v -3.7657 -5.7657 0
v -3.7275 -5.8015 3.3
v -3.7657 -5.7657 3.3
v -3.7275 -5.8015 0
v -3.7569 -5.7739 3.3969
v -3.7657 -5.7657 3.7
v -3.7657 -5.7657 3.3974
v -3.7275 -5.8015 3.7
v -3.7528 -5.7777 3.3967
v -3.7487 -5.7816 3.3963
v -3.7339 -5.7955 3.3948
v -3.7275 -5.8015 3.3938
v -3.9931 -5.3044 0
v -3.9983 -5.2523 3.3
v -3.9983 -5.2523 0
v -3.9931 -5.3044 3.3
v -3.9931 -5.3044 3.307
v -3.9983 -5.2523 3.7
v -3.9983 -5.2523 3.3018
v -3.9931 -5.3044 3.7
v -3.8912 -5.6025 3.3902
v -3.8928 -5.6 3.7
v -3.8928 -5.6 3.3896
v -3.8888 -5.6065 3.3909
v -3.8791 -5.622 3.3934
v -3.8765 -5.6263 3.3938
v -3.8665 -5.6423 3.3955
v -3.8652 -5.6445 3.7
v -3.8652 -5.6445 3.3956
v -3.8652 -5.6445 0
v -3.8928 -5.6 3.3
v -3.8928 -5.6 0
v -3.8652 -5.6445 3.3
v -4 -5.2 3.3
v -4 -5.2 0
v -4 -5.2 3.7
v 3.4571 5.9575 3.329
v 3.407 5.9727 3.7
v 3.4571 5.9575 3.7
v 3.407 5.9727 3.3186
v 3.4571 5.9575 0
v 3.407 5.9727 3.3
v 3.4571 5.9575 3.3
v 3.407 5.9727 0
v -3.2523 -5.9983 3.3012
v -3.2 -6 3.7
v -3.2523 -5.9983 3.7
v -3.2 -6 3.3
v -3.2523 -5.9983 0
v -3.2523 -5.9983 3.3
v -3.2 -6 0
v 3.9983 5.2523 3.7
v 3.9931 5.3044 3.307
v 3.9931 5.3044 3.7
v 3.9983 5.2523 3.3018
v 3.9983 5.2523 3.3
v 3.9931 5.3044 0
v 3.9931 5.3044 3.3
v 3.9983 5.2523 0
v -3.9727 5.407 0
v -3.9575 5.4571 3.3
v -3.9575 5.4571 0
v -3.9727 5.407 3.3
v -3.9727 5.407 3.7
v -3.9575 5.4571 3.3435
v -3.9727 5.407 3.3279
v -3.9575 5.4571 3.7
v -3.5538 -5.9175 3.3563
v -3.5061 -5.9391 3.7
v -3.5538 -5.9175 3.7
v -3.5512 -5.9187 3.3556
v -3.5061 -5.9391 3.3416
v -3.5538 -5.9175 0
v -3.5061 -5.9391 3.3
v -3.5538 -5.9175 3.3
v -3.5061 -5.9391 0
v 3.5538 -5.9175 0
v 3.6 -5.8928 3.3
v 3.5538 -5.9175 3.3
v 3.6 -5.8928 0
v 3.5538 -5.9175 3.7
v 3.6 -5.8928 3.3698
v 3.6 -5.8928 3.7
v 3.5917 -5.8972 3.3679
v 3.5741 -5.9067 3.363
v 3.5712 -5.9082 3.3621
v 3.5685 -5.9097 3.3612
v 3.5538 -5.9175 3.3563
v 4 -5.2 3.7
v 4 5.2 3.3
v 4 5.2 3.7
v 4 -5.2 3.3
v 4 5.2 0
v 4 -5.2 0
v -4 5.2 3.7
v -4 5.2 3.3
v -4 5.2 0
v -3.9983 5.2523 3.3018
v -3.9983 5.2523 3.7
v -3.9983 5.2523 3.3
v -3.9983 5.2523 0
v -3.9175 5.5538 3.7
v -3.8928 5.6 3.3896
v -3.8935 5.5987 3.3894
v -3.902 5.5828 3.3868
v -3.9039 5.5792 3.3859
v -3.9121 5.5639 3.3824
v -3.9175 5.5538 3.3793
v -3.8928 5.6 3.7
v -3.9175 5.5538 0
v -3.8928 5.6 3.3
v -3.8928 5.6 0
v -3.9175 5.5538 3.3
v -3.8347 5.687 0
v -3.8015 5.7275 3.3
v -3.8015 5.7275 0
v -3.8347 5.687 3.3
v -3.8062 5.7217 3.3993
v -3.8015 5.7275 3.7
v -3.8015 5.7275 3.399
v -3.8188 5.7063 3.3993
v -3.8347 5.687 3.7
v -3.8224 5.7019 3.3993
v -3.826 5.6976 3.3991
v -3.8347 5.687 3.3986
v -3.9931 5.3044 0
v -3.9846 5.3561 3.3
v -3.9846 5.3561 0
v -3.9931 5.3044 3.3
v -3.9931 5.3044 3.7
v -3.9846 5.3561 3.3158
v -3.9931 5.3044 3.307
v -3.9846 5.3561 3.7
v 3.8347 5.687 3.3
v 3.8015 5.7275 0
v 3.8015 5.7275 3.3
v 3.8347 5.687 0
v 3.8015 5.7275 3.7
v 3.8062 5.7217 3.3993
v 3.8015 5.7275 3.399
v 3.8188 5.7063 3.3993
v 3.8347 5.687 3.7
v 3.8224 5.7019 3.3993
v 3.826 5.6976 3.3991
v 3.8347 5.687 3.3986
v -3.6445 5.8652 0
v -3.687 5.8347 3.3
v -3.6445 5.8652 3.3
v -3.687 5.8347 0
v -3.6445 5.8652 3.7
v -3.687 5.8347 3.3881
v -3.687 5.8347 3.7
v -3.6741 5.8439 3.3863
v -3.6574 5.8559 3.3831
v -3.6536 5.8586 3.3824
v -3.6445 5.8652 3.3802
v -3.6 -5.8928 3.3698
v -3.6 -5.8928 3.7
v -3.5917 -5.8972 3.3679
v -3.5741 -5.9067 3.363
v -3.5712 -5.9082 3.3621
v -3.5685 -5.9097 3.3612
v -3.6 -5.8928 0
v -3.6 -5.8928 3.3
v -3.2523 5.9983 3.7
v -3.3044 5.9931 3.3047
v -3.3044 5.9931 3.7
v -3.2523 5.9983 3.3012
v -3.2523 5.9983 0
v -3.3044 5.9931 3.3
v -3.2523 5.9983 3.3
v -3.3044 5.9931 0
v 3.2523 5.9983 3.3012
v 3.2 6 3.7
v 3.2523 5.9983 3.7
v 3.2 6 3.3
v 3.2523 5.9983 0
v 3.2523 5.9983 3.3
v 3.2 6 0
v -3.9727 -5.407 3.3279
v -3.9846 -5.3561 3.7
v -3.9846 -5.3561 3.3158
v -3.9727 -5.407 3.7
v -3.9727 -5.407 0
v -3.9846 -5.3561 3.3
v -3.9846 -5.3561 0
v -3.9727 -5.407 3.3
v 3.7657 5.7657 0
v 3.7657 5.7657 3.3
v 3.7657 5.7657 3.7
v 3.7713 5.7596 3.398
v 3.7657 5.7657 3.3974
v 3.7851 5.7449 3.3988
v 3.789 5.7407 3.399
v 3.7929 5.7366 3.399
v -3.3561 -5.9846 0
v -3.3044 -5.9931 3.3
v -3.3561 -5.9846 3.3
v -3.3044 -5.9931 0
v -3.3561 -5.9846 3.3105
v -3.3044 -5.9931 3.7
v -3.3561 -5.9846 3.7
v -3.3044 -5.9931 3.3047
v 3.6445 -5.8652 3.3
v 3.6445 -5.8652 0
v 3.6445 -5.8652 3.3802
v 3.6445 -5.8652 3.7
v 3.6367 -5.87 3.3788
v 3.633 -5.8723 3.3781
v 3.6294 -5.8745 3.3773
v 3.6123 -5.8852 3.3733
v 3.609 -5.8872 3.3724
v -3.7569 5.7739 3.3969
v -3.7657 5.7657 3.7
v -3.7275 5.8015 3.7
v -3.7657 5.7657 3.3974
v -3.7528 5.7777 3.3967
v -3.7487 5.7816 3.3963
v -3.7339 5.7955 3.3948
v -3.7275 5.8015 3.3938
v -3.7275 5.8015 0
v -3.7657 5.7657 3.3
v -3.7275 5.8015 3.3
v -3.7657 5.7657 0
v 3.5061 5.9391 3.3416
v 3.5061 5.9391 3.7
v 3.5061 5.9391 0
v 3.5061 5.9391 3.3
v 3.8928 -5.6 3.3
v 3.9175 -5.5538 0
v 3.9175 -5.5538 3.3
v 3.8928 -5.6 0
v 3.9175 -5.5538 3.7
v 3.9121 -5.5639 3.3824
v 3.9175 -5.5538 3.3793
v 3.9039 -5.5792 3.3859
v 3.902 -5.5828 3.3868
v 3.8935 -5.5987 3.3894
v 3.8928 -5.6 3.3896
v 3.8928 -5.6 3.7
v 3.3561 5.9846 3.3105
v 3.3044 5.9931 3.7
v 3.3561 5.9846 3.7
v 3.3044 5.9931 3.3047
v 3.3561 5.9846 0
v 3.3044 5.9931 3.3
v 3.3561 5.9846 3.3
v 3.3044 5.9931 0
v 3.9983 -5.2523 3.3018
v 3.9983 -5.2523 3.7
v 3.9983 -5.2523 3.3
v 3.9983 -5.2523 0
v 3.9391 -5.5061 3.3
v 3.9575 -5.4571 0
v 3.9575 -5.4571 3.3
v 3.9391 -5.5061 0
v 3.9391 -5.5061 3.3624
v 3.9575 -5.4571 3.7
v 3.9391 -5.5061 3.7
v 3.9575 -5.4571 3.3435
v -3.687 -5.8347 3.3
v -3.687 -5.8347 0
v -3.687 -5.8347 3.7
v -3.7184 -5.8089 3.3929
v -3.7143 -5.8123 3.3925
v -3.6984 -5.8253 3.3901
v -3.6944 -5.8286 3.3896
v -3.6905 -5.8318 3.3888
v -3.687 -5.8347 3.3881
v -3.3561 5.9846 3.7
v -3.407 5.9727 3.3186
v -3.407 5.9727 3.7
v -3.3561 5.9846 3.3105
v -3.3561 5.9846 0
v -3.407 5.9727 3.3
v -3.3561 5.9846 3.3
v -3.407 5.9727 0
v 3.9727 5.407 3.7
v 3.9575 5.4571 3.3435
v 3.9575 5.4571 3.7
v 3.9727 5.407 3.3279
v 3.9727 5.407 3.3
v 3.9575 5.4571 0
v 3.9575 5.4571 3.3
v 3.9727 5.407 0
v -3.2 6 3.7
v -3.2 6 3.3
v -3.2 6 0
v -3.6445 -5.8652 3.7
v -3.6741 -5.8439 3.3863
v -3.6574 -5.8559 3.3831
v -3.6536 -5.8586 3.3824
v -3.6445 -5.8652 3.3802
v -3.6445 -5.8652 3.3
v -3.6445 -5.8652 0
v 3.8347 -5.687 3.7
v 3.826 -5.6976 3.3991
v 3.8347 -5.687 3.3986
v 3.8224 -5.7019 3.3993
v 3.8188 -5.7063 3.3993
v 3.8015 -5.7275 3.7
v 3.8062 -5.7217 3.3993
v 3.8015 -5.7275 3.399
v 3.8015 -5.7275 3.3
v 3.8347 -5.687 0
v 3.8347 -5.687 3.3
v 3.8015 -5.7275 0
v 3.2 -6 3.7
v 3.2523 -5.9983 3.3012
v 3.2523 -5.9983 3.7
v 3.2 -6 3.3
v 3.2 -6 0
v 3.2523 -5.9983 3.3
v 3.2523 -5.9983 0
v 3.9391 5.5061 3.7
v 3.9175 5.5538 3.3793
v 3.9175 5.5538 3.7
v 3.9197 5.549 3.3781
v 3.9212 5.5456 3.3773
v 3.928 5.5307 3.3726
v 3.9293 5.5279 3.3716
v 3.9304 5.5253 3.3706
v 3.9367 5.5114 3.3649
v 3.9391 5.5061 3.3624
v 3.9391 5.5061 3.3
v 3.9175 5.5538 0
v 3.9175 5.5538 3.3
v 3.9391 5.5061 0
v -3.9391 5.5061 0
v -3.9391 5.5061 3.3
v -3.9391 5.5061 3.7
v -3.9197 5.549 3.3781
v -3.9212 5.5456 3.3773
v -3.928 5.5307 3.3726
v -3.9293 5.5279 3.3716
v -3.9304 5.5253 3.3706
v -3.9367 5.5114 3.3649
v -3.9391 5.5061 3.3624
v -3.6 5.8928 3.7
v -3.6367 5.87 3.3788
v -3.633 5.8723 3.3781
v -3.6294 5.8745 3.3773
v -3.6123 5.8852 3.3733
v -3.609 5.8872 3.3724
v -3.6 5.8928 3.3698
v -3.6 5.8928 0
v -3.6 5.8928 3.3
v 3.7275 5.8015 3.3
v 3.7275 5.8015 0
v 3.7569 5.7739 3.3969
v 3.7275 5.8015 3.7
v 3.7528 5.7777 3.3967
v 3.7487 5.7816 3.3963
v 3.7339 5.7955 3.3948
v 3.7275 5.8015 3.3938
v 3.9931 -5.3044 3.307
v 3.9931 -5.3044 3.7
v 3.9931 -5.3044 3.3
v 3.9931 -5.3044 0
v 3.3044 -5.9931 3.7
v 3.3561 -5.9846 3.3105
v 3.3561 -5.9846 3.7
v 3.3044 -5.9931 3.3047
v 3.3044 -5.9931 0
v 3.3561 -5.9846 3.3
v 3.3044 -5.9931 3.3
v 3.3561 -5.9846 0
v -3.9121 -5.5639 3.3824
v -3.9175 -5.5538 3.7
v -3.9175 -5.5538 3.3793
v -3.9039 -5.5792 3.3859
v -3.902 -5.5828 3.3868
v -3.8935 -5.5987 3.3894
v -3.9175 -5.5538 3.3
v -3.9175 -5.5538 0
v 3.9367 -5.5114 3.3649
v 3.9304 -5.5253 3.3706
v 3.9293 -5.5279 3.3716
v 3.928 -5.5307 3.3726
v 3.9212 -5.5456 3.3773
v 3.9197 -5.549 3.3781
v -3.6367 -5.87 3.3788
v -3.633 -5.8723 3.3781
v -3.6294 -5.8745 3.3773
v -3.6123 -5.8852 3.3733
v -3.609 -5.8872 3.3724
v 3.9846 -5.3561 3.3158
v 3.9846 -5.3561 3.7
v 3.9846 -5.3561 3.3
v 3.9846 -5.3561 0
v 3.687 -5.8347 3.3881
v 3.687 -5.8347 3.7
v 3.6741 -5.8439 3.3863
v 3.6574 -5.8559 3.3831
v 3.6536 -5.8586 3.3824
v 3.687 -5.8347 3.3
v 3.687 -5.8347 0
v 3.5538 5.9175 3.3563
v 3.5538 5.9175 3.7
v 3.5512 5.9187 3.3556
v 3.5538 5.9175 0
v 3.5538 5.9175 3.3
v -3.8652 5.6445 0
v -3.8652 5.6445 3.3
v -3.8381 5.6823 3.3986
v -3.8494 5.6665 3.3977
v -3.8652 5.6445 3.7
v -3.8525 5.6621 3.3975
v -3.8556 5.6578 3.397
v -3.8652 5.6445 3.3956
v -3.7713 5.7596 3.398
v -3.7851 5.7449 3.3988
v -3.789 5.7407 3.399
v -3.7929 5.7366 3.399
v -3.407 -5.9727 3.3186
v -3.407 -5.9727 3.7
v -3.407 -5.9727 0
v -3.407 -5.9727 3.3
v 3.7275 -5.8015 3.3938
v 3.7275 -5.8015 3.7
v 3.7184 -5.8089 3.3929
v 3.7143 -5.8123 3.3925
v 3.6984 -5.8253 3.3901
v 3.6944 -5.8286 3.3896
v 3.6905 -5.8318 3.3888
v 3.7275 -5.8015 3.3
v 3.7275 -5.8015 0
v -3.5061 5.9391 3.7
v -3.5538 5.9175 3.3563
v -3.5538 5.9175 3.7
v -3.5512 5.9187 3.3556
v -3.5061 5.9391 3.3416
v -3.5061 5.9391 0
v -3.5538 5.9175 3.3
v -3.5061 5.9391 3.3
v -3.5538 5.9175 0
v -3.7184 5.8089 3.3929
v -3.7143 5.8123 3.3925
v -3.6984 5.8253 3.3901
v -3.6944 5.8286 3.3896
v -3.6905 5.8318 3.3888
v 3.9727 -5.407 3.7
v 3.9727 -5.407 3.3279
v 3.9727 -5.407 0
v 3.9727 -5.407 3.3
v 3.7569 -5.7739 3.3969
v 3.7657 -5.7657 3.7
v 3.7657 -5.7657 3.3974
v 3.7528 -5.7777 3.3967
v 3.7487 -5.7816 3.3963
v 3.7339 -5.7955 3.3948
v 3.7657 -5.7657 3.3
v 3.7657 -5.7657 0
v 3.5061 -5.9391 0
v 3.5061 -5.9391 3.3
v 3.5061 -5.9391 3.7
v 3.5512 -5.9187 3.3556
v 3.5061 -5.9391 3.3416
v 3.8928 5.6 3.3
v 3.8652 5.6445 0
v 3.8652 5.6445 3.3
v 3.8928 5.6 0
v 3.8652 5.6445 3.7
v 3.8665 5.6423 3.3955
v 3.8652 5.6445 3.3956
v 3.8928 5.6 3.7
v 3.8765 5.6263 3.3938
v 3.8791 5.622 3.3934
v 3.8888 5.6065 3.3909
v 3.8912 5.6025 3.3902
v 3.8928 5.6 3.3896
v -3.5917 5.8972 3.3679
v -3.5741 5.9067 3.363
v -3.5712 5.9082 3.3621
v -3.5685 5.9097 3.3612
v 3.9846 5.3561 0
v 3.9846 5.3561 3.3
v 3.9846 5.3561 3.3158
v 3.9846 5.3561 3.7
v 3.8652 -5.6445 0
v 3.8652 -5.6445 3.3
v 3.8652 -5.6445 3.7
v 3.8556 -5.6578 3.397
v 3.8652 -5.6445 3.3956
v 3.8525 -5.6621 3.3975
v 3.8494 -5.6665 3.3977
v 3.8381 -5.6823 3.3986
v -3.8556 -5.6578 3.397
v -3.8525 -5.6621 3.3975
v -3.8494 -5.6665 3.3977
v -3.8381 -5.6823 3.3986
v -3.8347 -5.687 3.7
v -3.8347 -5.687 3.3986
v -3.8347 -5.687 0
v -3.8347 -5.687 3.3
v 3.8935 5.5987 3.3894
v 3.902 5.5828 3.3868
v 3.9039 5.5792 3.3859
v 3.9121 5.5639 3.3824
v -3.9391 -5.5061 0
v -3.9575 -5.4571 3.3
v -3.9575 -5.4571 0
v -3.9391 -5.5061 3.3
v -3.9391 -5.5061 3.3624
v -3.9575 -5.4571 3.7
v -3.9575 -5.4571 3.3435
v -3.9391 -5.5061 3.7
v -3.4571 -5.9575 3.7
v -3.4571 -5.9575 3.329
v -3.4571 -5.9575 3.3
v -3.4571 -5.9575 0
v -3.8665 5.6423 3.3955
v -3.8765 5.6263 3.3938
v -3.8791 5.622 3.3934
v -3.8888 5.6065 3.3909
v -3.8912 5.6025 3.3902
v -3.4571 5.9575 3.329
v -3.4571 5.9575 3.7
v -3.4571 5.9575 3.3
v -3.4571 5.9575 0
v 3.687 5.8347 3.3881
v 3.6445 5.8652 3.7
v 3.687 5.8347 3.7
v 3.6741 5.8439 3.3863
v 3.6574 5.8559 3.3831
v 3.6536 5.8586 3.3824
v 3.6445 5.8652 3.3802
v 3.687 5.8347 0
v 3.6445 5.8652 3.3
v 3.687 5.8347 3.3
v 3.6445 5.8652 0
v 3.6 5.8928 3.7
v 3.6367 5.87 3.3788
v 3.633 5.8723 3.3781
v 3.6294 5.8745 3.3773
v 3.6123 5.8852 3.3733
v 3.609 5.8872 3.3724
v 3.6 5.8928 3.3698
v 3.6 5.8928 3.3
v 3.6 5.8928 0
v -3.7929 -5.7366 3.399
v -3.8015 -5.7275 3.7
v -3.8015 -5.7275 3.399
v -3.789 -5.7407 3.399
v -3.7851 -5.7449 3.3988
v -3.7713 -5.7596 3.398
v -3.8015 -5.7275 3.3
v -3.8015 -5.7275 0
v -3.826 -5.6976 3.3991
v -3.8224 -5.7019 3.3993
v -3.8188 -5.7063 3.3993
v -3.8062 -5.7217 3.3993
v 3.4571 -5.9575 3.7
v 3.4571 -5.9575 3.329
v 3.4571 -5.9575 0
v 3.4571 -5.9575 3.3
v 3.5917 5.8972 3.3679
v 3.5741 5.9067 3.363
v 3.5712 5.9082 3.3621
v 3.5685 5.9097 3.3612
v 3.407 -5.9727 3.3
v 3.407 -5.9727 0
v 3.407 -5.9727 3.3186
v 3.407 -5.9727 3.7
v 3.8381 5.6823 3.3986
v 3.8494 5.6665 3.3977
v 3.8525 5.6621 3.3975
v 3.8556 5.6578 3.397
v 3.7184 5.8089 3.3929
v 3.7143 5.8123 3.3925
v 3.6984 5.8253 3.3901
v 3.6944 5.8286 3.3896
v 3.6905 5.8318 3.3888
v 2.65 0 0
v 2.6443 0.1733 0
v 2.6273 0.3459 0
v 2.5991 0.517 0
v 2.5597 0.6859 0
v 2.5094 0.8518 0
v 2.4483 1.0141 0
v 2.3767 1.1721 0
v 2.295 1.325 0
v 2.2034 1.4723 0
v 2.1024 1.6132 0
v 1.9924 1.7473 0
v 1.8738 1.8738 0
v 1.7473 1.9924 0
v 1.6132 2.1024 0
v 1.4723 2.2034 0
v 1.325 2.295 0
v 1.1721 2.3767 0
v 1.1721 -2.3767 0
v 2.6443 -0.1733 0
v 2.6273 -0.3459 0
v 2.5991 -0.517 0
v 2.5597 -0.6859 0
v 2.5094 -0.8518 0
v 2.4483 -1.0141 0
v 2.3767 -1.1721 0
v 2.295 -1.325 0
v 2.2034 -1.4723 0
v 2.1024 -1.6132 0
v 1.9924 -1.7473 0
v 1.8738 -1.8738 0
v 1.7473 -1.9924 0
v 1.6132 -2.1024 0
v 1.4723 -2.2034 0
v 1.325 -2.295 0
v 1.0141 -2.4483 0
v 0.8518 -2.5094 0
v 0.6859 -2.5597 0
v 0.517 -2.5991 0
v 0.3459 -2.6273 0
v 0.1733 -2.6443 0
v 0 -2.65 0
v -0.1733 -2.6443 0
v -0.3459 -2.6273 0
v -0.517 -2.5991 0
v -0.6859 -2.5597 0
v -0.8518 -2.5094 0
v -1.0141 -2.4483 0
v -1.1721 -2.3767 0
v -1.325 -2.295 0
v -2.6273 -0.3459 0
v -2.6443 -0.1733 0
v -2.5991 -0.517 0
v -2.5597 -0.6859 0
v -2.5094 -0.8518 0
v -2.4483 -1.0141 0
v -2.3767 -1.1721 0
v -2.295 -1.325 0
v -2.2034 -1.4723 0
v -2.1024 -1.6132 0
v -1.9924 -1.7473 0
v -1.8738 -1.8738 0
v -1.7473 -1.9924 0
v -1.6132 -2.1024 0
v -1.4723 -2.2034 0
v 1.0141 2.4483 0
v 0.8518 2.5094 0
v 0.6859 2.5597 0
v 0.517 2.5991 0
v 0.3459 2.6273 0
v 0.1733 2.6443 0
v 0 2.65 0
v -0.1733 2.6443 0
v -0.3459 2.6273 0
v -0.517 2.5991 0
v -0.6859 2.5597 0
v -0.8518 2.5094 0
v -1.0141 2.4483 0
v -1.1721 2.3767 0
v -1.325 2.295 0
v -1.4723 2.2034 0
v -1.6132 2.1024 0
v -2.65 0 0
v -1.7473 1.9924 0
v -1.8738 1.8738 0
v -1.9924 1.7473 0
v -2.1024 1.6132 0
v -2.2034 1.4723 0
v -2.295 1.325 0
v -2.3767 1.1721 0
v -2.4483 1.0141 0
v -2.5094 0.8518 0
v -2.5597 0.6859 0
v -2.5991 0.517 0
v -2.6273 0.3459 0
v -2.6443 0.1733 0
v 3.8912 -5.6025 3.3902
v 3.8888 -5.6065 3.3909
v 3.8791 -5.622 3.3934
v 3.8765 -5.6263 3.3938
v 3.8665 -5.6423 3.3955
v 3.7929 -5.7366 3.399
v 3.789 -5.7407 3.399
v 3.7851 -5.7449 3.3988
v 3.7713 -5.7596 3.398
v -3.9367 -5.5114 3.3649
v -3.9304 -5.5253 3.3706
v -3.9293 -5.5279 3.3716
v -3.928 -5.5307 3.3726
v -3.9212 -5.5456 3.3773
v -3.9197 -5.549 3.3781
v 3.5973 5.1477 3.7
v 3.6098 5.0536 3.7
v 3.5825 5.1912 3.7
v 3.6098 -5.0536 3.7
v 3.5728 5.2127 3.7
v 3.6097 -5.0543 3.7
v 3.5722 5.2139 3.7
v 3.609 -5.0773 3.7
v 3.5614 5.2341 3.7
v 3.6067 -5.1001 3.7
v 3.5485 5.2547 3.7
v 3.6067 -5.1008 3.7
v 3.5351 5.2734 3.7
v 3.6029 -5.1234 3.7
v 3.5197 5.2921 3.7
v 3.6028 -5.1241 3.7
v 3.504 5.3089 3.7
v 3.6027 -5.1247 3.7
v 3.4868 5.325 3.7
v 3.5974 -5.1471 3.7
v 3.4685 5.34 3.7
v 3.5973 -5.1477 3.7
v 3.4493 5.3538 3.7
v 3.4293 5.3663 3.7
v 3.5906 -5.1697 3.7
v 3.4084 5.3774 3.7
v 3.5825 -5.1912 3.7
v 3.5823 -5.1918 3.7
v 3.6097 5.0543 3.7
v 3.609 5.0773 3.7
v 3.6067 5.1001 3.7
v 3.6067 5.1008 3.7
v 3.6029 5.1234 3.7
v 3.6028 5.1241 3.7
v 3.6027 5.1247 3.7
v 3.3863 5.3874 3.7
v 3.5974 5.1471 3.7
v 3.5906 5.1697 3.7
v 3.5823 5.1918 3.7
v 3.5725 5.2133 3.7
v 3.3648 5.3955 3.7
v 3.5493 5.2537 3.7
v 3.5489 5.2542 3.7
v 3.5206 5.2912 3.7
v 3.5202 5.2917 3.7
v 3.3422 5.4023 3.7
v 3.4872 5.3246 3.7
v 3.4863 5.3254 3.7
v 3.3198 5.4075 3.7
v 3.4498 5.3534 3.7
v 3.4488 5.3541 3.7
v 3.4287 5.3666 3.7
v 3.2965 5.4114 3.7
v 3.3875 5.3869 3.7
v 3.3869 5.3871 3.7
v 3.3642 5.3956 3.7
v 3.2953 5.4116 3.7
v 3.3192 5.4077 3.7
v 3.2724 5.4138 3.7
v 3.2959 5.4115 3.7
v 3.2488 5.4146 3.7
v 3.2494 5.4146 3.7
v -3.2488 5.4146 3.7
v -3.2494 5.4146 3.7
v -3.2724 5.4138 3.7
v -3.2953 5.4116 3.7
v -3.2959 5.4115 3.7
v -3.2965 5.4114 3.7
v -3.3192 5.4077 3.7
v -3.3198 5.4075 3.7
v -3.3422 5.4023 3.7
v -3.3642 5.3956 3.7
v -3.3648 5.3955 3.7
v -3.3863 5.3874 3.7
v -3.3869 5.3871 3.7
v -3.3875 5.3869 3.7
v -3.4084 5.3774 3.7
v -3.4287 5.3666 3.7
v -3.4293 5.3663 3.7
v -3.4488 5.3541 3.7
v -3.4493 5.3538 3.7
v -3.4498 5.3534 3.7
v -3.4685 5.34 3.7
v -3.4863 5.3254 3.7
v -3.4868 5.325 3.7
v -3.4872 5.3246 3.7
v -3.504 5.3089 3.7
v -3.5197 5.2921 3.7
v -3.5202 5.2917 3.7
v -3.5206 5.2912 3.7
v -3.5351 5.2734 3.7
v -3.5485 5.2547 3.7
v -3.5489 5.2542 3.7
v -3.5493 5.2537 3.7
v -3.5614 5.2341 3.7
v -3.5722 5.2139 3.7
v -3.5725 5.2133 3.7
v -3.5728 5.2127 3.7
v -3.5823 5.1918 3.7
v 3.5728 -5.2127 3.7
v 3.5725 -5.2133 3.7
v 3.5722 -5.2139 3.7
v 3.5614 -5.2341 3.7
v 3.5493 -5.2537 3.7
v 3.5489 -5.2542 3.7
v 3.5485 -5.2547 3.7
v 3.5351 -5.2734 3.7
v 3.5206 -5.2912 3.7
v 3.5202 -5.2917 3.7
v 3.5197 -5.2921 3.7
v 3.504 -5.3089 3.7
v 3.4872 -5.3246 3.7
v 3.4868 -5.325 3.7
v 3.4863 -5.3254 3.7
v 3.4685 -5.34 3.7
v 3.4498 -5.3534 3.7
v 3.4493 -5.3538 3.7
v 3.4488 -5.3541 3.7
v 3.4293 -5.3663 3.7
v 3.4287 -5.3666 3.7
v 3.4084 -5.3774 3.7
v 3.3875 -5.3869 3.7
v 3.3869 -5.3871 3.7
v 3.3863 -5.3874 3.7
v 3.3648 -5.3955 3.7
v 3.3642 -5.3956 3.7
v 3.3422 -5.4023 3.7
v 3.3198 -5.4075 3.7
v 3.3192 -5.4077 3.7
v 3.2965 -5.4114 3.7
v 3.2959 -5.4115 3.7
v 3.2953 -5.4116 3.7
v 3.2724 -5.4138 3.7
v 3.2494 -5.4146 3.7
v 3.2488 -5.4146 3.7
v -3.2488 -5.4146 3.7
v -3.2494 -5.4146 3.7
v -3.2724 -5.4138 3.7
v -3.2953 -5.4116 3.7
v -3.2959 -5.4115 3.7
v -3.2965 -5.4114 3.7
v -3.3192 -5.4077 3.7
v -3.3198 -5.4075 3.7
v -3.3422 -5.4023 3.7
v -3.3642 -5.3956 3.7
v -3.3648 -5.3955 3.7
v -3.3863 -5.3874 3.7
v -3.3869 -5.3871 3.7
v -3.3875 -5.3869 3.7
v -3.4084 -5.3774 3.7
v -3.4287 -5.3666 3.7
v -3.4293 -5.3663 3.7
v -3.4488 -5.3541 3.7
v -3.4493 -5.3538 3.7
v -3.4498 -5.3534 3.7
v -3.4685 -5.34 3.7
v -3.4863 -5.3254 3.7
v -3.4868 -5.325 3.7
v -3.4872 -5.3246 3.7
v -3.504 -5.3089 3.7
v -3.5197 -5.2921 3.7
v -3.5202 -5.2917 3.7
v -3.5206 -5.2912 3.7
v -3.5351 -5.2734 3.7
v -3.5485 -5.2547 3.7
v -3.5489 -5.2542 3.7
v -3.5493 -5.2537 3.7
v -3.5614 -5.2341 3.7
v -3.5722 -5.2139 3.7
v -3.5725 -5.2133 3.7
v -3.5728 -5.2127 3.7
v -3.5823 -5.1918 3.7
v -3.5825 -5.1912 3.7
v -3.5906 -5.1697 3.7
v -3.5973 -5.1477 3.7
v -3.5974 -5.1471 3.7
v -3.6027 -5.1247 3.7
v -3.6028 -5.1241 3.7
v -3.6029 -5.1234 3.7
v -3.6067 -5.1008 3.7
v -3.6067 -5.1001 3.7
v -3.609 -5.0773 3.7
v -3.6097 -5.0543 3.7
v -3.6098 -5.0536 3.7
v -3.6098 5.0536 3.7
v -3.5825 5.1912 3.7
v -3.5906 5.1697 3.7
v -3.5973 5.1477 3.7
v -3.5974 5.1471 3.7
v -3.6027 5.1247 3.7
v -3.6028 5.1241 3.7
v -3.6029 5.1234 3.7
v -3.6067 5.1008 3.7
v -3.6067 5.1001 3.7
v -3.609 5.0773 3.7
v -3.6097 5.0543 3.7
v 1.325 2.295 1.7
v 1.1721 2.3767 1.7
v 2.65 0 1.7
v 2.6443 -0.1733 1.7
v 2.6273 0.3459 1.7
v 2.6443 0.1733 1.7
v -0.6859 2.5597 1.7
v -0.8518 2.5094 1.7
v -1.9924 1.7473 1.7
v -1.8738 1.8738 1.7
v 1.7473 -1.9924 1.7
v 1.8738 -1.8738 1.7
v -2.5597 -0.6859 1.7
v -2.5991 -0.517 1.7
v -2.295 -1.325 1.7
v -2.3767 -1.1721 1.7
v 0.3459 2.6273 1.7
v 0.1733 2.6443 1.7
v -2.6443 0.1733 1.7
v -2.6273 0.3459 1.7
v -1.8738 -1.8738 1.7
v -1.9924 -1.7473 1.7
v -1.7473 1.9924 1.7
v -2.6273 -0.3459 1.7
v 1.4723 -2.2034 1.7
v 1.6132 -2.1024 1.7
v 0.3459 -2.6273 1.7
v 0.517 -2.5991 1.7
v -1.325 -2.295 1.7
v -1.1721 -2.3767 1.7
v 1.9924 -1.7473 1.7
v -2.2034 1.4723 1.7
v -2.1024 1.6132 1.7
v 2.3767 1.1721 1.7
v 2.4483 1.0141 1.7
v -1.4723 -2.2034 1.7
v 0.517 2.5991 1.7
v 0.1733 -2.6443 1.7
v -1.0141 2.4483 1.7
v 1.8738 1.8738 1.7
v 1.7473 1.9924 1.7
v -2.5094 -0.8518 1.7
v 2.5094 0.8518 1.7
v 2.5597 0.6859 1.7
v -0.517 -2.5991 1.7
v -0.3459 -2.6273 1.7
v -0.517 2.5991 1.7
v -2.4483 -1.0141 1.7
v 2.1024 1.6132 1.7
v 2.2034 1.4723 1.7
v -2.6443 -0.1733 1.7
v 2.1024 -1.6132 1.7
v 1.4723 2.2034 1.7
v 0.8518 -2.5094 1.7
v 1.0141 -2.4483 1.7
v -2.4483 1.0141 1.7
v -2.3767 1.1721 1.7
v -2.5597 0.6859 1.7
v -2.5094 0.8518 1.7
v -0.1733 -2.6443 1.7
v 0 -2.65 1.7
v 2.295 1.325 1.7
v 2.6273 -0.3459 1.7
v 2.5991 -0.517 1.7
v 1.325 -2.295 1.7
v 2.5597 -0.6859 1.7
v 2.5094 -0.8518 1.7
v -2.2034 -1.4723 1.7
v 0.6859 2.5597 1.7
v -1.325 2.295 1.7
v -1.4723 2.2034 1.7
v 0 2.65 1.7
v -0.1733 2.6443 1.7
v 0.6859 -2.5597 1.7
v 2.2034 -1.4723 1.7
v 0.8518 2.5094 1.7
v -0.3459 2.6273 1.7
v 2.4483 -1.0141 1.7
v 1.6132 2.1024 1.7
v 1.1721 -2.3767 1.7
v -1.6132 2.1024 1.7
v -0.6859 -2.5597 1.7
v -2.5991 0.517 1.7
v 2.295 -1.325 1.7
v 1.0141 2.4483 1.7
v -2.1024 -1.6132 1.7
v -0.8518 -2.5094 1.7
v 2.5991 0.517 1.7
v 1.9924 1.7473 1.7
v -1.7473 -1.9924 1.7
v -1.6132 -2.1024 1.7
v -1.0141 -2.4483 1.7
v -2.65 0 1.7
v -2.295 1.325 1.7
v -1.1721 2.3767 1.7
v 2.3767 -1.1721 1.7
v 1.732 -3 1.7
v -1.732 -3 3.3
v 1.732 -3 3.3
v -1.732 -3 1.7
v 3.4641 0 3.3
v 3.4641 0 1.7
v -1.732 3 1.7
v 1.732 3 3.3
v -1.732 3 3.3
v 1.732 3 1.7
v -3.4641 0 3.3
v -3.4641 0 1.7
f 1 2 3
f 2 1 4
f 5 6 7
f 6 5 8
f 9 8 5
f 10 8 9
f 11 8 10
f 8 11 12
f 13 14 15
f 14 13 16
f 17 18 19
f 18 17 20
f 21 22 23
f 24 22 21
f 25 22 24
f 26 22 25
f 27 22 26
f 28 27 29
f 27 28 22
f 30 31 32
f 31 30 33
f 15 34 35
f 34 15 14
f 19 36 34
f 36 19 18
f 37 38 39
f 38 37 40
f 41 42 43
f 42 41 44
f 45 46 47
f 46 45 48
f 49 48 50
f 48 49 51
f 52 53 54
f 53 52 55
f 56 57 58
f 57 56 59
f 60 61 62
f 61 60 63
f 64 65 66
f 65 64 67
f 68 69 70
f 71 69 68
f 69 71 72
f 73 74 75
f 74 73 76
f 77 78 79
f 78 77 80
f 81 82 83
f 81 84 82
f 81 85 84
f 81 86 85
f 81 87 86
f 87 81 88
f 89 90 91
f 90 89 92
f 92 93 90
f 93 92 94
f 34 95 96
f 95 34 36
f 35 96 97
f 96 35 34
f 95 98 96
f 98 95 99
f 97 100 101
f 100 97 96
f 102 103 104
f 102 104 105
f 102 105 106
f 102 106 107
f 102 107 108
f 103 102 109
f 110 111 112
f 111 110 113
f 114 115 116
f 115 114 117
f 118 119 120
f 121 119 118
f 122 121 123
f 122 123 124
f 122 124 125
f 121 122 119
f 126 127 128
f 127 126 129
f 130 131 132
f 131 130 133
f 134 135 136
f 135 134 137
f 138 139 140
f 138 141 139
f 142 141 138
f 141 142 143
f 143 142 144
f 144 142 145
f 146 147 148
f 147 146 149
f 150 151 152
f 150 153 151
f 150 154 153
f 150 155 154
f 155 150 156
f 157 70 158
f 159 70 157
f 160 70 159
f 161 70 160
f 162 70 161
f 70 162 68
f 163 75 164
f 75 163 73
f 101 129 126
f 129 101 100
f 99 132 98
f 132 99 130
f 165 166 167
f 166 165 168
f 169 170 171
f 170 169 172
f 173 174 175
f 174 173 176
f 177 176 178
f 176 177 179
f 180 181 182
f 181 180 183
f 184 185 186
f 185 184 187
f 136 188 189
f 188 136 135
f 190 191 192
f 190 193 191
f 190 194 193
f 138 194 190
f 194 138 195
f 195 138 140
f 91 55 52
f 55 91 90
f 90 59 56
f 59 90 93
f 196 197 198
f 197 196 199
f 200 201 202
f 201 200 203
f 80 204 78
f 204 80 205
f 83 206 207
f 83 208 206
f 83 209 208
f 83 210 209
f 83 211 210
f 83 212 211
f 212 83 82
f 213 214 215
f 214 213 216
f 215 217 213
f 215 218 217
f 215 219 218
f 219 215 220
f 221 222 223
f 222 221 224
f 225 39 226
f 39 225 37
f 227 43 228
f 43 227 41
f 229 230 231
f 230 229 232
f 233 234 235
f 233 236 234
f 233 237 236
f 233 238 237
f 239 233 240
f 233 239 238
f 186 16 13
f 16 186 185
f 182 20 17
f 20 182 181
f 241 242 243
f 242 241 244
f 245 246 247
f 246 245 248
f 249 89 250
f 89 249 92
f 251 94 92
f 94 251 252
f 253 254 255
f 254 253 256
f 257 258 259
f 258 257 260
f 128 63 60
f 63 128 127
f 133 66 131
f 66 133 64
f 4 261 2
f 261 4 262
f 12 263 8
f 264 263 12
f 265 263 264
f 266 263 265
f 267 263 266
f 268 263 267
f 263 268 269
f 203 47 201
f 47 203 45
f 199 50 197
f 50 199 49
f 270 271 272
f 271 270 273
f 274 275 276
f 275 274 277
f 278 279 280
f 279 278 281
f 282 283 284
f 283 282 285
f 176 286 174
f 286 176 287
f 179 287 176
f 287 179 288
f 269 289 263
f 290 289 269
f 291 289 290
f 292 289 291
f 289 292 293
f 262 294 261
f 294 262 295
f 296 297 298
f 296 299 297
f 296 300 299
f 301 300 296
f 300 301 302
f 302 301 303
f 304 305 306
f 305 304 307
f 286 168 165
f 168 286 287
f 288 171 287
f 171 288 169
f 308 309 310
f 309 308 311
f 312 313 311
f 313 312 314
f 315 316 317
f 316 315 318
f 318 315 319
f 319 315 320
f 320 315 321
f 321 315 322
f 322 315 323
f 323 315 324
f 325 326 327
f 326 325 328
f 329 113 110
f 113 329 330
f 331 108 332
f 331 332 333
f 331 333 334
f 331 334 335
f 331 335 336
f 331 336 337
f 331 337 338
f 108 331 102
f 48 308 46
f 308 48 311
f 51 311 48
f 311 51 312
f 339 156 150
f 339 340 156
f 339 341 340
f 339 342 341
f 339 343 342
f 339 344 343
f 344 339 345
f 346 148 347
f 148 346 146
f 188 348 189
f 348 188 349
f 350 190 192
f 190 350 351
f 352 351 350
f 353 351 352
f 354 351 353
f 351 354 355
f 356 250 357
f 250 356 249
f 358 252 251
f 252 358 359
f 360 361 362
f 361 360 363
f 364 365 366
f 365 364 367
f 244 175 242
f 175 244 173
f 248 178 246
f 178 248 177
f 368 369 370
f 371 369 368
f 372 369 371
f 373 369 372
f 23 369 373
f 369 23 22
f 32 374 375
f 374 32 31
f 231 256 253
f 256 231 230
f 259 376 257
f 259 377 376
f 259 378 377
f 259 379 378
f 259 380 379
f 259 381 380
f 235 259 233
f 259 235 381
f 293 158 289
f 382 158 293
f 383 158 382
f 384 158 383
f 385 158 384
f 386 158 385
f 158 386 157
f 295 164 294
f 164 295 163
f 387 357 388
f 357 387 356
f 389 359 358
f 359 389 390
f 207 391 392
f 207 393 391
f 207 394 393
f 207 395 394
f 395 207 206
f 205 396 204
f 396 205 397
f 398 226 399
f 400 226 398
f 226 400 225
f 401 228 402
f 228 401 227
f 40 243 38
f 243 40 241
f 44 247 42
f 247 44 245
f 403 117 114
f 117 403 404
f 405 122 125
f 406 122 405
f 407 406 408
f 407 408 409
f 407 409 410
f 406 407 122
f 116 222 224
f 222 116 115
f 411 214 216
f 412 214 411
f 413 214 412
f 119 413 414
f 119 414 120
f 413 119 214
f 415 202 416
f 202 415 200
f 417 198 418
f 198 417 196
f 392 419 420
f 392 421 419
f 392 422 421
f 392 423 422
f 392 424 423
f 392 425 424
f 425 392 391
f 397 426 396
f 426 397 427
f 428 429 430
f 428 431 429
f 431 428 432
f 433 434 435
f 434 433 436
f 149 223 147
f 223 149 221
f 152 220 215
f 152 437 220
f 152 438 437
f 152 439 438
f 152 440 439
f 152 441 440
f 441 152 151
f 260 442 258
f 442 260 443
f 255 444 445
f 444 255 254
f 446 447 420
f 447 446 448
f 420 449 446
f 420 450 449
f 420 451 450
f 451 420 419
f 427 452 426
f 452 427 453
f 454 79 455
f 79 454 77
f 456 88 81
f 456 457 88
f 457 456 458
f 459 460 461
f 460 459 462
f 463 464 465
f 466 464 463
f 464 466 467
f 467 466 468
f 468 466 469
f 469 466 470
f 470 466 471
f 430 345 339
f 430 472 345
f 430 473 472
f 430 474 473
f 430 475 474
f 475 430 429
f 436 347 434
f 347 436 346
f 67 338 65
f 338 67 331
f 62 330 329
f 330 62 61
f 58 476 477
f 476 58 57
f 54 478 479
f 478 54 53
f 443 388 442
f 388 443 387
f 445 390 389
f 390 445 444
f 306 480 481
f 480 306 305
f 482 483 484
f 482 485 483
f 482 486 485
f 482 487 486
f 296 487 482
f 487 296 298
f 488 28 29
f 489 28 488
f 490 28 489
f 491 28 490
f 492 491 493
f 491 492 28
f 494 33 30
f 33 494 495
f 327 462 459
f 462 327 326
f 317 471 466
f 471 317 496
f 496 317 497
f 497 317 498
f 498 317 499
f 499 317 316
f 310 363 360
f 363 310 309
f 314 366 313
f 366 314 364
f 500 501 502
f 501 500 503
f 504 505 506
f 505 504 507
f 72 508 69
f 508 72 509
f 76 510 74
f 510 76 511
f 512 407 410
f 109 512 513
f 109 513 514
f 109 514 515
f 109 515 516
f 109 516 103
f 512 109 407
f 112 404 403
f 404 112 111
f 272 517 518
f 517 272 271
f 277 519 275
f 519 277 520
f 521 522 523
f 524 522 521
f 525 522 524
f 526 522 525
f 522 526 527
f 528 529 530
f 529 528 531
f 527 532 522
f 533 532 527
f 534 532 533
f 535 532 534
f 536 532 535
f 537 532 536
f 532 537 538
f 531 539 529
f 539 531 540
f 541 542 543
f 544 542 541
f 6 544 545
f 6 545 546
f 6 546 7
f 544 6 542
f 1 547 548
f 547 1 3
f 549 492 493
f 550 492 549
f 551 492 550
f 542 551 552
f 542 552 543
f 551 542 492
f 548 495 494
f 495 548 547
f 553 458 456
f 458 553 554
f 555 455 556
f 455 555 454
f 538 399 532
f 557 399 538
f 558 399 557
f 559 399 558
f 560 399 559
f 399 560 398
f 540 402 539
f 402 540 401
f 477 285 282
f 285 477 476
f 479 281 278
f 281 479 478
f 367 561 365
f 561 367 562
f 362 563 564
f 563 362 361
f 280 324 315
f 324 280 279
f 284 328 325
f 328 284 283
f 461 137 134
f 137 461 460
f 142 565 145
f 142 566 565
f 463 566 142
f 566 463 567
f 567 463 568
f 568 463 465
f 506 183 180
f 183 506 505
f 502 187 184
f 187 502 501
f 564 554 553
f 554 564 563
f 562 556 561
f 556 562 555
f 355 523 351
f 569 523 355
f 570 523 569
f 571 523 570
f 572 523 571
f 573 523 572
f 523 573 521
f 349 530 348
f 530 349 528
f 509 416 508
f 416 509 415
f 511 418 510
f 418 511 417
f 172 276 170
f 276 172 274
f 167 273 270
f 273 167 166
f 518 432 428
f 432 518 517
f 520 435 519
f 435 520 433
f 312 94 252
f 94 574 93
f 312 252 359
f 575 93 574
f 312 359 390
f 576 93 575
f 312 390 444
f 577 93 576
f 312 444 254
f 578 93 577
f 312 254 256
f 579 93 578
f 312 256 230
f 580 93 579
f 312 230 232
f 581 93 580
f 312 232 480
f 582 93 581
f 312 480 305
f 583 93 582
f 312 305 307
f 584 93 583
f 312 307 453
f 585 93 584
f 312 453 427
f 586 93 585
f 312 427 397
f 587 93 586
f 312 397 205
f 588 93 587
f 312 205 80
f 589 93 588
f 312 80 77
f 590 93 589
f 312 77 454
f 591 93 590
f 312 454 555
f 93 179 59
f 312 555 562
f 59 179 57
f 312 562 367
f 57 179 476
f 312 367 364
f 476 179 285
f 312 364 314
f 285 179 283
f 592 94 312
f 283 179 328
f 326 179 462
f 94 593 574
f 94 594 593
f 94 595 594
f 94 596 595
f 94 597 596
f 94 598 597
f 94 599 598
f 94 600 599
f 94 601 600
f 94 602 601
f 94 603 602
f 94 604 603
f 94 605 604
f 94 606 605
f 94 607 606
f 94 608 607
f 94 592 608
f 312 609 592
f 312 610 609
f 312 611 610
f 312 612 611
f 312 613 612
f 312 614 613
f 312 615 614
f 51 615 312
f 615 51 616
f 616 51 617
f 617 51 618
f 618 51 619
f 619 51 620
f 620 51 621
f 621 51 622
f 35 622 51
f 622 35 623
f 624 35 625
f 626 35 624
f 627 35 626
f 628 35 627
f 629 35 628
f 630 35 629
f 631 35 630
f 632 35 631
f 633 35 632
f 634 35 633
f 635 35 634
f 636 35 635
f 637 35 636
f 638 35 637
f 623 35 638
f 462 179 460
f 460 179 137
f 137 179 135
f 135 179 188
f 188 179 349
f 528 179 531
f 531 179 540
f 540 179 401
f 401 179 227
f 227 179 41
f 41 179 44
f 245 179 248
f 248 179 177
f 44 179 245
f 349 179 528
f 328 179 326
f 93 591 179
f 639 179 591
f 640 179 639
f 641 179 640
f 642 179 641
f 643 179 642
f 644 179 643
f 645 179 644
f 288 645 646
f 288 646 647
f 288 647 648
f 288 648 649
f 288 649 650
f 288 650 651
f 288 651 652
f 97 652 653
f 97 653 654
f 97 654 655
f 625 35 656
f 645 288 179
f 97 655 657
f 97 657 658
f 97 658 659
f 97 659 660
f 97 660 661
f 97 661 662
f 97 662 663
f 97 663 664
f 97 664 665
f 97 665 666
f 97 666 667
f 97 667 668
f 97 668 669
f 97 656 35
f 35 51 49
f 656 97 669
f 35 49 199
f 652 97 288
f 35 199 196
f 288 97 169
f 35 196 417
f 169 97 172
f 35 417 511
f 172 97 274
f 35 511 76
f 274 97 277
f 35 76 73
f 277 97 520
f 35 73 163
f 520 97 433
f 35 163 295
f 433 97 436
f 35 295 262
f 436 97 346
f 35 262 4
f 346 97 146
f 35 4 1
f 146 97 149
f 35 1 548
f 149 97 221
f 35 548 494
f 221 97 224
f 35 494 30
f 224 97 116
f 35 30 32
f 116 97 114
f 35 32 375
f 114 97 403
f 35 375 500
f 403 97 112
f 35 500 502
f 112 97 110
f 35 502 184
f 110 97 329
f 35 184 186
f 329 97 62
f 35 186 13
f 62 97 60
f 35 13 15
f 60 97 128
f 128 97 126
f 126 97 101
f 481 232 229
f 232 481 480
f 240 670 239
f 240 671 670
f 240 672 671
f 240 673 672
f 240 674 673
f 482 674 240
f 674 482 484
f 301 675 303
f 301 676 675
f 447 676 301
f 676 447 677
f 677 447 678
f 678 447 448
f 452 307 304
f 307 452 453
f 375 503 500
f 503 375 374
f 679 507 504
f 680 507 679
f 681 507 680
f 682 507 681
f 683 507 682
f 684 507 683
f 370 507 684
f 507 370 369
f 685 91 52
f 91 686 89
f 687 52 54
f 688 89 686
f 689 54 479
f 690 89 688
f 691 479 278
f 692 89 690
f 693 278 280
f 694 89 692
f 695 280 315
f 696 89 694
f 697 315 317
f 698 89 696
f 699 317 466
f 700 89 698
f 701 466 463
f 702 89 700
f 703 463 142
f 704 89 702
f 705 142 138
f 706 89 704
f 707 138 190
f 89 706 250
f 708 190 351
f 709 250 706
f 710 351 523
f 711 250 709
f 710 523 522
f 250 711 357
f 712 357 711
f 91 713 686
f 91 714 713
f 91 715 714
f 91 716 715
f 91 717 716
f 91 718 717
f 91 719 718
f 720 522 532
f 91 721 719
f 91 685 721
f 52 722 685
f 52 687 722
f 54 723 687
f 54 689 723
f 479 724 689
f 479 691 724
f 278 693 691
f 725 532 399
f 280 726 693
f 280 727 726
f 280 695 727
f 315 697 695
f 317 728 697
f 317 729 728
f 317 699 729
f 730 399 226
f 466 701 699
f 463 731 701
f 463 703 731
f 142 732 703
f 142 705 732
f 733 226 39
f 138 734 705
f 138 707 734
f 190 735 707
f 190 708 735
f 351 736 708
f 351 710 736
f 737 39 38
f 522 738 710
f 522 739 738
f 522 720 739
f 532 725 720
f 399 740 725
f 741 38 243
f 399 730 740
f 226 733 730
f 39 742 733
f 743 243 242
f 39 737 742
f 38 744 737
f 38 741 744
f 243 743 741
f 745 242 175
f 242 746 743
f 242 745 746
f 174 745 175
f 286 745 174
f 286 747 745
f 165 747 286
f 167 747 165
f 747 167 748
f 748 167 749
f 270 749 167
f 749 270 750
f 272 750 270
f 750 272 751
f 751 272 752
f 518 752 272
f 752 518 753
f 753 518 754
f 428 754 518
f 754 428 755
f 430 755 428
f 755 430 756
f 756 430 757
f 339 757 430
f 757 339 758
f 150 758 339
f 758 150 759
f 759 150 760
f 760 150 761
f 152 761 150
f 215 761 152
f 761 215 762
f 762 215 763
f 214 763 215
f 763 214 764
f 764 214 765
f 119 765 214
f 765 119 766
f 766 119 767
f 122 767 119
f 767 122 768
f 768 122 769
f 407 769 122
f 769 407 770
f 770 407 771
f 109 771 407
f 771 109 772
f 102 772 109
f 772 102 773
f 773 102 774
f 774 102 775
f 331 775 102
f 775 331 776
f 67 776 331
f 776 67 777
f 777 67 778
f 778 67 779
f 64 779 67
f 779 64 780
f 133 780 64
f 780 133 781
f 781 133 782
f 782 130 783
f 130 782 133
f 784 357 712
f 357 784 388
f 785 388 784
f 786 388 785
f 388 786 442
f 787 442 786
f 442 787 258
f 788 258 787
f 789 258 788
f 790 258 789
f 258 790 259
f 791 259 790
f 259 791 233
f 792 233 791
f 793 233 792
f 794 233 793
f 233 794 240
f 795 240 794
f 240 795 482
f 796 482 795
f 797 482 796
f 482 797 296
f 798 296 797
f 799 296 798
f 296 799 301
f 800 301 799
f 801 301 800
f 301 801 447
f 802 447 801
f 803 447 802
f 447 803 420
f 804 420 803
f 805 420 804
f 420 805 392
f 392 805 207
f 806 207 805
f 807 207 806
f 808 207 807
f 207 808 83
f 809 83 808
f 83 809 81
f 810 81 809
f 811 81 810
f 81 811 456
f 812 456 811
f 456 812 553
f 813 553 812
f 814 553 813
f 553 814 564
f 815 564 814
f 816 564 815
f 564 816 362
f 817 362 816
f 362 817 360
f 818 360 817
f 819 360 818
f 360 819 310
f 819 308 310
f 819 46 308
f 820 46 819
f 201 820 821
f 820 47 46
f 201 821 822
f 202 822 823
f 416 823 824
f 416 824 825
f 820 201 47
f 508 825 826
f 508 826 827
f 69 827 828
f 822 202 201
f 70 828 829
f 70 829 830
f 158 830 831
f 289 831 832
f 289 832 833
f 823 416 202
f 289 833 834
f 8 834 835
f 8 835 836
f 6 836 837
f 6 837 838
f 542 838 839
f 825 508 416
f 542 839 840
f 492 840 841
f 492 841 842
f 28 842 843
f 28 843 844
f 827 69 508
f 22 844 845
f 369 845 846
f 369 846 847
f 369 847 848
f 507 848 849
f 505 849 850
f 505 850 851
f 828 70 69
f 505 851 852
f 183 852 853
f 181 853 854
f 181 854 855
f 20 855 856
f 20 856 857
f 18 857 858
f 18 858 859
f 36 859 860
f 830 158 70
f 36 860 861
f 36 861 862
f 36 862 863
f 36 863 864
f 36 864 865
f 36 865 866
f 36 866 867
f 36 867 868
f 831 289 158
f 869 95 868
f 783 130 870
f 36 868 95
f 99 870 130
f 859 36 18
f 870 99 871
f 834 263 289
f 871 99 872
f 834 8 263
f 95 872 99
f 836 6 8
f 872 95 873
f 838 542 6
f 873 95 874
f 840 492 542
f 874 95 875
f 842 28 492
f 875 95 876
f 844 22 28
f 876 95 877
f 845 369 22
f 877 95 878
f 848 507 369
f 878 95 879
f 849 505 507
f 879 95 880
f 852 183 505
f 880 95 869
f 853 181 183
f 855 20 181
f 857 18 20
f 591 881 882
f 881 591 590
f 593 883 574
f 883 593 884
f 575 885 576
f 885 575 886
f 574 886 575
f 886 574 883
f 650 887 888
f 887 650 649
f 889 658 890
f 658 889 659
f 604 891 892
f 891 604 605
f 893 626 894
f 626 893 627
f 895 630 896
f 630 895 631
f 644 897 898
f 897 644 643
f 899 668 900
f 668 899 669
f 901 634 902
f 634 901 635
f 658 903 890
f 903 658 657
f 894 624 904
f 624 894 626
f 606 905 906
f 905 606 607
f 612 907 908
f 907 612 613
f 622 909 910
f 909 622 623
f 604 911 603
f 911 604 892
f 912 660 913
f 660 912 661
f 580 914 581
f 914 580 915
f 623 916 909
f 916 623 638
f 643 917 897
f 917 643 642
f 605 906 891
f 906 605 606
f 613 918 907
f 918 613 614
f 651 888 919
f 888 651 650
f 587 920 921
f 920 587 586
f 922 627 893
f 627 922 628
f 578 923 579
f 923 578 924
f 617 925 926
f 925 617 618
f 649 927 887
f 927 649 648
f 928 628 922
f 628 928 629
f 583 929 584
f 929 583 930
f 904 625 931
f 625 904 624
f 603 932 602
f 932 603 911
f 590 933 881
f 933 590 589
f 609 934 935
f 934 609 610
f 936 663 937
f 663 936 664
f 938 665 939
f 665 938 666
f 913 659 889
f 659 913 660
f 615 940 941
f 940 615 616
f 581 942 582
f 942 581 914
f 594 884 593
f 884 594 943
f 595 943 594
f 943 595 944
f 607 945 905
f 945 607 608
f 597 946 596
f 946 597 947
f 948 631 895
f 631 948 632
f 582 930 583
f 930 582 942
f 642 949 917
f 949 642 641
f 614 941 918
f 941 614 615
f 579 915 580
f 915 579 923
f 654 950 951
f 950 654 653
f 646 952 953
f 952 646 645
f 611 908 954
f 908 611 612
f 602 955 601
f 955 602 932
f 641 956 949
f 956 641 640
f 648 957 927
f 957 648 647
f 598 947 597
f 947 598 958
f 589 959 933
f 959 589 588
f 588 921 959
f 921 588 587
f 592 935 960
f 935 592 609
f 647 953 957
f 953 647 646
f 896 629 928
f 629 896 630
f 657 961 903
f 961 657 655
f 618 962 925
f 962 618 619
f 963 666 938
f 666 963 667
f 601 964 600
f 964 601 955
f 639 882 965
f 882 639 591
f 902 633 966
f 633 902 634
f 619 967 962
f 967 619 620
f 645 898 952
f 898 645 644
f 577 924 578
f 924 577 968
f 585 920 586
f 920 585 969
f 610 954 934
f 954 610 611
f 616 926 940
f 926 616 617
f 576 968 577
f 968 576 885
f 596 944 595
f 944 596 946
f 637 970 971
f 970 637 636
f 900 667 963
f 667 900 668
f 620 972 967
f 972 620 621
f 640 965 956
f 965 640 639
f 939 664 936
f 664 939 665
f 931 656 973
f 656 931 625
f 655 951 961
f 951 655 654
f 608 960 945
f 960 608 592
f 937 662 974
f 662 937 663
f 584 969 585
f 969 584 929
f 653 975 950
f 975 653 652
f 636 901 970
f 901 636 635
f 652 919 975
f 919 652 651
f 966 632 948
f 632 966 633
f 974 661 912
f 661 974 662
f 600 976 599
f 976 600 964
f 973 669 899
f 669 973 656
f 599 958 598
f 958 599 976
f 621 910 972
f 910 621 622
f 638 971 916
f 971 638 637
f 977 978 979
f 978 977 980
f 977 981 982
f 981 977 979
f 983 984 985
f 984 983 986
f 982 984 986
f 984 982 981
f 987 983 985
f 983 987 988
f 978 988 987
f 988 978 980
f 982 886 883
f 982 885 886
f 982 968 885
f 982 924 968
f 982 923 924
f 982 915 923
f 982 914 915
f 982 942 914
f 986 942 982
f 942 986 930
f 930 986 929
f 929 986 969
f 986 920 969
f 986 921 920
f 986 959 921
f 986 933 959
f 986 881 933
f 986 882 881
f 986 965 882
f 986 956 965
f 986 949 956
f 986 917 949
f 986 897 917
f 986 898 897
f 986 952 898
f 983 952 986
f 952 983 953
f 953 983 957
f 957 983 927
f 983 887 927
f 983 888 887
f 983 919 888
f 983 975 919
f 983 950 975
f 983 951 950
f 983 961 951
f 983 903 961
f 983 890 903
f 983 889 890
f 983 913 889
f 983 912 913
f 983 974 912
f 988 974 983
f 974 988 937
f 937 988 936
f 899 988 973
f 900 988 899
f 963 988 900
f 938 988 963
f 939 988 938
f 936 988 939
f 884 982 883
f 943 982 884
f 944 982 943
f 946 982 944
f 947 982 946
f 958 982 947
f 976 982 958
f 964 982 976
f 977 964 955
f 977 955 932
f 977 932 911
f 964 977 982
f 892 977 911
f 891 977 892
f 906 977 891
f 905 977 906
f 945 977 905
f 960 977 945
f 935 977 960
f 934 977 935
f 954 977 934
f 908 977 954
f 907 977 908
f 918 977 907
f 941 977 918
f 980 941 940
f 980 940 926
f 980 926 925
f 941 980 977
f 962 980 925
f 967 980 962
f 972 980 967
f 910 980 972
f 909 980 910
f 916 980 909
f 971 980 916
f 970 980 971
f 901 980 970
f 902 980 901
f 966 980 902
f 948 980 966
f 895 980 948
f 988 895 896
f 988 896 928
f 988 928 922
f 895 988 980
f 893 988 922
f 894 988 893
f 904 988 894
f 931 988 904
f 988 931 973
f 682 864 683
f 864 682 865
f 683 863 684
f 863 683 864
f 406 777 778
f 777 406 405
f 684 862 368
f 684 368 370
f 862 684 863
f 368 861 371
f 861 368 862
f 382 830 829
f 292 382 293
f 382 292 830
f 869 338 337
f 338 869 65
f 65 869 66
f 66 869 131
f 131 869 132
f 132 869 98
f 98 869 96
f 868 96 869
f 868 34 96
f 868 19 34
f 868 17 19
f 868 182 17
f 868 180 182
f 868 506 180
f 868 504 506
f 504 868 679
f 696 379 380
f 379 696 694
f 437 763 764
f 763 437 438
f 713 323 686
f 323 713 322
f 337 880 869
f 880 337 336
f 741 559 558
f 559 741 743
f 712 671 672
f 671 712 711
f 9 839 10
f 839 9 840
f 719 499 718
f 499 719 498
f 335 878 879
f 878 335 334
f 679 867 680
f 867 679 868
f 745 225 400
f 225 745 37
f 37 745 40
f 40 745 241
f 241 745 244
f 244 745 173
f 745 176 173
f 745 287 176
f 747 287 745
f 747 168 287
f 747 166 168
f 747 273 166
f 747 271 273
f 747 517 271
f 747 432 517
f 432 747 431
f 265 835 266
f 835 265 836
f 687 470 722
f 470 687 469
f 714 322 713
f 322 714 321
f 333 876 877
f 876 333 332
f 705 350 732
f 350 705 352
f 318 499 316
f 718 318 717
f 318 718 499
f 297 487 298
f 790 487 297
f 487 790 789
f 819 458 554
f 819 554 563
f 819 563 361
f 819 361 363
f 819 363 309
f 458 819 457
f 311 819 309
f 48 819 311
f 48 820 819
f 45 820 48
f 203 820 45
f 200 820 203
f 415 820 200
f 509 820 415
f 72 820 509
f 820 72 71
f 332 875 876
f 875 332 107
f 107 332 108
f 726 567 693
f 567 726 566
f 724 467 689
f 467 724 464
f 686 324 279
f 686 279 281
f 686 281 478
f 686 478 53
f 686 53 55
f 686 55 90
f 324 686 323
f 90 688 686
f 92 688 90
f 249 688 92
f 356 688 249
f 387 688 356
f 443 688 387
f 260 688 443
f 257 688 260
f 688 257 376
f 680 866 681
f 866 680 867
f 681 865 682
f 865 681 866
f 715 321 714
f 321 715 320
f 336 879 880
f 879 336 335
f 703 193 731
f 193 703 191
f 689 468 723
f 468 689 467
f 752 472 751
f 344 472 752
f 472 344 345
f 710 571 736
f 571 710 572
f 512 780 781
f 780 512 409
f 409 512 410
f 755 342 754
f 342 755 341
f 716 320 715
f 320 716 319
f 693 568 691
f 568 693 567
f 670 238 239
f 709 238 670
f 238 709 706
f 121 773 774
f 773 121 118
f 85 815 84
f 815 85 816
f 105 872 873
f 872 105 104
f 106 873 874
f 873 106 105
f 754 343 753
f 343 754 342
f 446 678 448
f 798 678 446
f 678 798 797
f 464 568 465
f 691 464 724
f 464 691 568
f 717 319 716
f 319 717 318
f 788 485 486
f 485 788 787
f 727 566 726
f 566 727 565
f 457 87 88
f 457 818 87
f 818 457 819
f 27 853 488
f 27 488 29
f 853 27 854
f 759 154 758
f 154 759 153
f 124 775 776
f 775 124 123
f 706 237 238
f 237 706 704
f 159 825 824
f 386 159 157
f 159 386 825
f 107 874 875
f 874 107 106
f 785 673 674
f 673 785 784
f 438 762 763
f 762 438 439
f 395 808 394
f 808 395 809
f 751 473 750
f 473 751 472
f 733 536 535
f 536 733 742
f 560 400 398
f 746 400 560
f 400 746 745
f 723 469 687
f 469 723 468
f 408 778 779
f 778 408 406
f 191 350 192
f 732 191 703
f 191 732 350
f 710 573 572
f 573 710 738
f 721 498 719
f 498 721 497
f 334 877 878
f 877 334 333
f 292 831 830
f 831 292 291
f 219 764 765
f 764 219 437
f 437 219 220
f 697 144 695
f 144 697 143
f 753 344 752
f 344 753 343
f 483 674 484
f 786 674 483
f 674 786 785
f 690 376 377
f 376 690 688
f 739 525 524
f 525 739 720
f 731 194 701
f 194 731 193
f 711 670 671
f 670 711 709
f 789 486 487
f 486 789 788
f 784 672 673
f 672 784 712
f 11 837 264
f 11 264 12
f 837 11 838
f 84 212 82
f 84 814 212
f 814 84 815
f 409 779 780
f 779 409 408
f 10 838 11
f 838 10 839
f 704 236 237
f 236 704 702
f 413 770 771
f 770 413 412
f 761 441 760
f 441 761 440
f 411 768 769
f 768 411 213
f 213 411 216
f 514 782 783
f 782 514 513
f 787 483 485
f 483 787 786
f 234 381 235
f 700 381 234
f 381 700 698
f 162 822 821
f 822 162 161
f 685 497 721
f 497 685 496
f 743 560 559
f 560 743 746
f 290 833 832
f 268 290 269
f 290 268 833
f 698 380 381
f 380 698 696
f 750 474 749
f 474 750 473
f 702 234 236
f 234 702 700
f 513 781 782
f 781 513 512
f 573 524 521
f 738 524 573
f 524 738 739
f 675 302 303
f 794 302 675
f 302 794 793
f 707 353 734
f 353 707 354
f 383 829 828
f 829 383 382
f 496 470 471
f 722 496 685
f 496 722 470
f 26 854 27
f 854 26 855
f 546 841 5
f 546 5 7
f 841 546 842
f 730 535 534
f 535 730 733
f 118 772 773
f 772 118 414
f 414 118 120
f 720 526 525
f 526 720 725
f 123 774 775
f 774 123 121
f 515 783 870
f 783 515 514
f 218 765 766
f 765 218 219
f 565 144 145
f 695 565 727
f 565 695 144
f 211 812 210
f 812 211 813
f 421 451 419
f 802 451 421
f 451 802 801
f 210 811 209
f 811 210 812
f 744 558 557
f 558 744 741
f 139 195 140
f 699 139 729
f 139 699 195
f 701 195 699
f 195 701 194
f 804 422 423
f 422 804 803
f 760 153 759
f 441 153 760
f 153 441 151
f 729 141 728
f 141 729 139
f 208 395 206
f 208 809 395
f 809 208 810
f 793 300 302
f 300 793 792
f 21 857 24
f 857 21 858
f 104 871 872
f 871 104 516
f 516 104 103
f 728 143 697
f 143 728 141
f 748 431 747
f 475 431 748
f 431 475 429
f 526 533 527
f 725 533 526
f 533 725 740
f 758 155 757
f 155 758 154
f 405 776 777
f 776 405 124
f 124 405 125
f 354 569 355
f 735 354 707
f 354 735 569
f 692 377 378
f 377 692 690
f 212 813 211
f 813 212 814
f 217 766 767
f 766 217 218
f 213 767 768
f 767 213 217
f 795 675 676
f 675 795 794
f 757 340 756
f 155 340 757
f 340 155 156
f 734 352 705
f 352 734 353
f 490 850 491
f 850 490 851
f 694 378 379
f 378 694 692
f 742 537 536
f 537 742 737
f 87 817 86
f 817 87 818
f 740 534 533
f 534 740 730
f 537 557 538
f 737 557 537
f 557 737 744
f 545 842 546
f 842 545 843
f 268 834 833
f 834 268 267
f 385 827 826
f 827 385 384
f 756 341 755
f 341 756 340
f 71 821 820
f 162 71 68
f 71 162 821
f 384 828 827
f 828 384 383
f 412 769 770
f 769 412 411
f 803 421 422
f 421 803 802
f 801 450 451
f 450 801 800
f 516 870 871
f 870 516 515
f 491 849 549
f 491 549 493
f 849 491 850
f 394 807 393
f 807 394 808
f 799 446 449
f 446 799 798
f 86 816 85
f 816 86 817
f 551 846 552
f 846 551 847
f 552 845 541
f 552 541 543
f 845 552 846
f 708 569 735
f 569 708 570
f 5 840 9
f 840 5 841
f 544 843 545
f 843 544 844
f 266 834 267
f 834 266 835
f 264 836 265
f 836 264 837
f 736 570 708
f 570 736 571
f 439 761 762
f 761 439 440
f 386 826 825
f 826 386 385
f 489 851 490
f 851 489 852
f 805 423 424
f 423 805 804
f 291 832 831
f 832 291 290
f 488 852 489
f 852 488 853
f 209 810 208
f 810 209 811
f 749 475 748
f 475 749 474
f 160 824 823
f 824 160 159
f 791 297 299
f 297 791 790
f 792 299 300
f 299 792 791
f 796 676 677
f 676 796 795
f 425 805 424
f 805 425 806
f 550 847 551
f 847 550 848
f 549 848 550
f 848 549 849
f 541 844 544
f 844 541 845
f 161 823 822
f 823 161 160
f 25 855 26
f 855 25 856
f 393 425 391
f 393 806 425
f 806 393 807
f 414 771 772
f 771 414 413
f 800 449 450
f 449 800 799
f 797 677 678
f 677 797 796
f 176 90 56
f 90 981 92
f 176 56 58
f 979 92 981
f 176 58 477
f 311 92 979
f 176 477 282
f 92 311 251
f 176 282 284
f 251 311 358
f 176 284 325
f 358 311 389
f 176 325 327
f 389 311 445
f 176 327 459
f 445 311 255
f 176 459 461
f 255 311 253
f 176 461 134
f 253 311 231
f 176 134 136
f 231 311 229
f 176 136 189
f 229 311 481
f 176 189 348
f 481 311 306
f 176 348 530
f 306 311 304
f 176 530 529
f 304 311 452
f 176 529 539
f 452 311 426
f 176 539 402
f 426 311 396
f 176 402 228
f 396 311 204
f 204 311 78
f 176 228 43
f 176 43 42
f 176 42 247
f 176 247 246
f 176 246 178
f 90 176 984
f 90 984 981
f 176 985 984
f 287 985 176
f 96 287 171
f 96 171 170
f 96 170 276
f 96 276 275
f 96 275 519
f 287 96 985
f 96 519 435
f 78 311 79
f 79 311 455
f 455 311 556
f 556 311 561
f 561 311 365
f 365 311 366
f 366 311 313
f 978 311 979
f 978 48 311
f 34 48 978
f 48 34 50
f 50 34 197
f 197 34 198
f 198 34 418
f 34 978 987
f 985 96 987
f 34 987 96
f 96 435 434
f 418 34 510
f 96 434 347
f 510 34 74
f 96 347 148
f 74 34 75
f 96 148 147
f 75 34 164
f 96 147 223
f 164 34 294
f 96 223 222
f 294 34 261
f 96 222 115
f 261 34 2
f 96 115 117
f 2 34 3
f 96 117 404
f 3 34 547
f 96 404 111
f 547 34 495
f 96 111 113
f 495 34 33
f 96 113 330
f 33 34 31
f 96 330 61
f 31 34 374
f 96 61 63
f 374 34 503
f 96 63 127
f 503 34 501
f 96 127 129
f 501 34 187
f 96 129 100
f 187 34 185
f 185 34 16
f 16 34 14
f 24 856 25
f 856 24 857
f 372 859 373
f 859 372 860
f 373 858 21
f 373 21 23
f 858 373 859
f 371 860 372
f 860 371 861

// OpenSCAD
$fn = 96;

// T-slot nut parameters (mm)
thickness = 3.7;          // overall thickness
across_flats = 6.0;       // hex across flats
screw_d = 5.0;            // screw diameter (clearance-ish)
clearance = 0.3;          // extra clearance for screw hole

// Typical small T-slot nut proportions (adjust if needed)
slot_width = 8.0;         // width to fit slot opening
slot_length = 12.0;       // length along slot
corner_r = 0.8;           // corner rounding
top_chamfer = 0.4;        // slight edge break

module rounded_rect_2d(w, l, r){
    r2 = min(r, min(w,l)/2);
    hull(){
        for (sx=[-1,1], sy=[-1,1])
            translate([sx*(w/2 - r2), sy*(l/2 - r2)]) circle(r=r2);
    }
}

module tslot_nut(){
    difference(){
        // Body
        linear_extrude(height=thickness)
            rounded_rect_2d(slot_width, slot_length, corner_r);

        // Screw hole
        translate([0,0,-0.2])
            cylinder(h=thickness+0.4, d=screw_d+clearance);

        // Hex recess on top (for 6mm AF nut driver / captive feature)
        // Depth kept modest to preserve strength
        hex_depth = min(2.0, thickness*0.65);
        translate([0,0,thickness-hex_depth])
            cylinder(h=hex_depth+0.01, d=across_flats / cos(30), $fn=6);

        // Small top chamfer (edge break)
        if (top_chamfer > 0){
            translate([0,0,thickness-top_chamfer])
                linear_extrude(height=top_chamfer+0.01, scale=(slot_width-2*top_chamfer)/slot_width)
                    rounded_rect_2d(slot_width, slot_length, max(0, corner_r-top_chamfer));
        }
    }
}

tslot_nut();
